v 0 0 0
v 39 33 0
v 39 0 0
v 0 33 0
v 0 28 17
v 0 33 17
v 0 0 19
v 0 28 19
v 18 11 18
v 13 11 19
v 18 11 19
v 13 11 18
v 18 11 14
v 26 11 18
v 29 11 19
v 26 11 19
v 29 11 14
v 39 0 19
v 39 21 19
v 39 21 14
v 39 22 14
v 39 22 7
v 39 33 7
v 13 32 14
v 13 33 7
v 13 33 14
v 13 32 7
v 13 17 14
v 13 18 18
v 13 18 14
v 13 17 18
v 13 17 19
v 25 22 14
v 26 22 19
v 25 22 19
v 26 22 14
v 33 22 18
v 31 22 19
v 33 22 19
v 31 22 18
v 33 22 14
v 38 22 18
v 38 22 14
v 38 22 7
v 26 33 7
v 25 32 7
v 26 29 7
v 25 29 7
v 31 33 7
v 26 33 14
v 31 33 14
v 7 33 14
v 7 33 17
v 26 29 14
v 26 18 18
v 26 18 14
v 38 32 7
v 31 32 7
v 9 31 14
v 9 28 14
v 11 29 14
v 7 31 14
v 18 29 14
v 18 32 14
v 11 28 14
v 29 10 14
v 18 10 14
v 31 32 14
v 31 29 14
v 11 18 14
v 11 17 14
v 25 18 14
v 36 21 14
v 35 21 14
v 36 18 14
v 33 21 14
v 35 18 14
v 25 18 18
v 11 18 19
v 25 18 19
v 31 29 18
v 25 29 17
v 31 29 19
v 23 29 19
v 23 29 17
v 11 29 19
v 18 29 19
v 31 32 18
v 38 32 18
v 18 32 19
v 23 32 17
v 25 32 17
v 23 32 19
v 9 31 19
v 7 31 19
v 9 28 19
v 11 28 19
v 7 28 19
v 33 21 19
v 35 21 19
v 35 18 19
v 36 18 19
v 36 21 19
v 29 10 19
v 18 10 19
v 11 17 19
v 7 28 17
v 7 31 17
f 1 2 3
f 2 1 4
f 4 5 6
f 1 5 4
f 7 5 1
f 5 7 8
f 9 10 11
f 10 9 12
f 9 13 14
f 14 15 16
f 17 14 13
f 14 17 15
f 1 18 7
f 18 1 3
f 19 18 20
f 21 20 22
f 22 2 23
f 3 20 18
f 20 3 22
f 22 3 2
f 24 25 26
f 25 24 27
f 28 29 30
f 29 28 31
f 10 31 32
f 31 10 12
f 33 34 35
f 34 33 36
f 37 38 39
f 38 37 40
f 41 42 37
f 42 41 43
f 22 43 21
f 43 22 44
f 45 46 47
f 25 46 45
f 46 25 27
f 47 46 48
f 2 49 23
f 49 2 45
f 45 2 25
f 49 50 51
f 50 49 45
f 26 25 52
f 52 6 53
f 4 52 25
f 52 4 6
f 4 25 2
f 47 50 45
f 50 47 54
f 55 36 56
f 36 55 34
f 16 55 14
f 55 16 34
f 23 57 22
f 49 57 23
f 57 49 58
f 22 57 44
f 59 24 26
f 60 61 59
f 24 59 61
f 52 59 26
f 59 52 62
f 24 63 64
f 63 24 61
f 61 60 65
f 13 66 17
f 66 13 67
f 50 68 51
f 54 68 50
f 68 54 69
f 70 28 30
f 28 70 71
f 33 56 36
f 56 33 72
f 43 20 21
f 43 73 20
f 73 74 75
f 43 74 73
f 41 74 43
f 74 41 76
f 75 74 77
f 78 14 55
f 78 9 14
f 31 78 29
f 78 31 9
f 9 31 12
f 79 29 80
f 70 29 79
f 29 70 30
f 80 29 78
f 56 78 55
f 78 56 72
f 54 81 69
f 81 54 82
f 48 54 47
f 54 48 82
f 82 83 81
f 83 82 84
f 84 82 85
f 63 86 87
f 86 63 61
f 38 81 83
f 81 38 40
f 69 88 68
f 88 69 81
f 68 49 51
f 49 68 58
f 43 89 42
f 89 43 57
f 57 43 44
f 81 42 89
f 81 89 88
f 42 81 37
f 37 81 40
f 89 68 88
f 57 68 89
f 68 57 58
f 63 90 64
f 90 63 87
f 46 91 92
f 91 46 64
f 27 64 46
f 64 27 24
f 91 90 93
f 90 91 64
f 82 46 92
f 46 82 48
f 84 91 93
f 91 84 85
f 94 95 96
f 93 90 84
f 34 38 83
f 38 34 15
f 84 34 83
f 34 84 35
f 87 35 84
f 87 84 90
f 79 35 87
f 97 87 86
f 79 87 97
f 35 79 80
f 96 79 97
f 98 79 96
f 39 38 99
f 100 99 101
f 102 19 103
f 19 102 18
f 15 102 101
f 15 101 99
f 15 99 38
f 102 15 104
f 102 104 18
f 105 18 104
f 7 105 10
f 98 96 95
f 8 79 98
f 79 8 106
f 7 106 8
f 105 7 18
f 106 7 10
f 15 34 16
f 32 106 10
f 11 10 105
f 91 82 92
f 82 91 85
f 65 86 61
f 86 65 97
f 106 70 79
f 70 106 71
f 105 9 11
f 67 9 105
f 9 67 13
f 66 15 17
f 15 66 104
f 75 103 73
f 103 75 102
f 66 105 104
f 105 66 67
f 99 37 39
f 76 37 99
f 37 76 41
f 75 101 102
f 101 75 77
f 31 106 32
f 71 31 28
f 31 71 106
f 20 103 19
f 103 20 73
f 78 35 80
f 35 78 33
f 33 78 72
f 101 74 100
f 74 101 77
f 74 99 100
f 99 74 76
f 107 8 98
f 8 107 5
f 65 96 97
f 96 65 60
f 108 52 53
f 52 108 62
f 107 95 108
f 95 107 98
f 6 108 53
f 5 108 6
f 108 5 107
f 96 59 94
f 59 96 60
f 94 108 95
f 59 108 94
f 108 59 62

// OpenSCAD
translate([6.5, 5.5, 3.5]) color([0.8768405645756486, 0.1552431358080847, 0.1767648869043179]) cube([13, 11, 7], center=true);
translate([19.5, 5.5, 3.5]) color([0.991228648099722, 0.13558077637136434, 0.20650423900368708]) cube([13, 11, 7], center=true);
translate([32.5, 5.5, 3.5]) color([0.9151210693627757, 0.49673738754911745, 0.7672539256192649]) cube([13, 11, 7], center=true);
translate([6.5, 16.5, 3.5]) color([0.969306850533619, 0.23531586477578126, 0.13212860983739783]) cube([13, 11, 7], center=true);
translate([19.5, 16.5, 3.5]) color([0.23368957459901674, 0.38460662479298113, 0.6084990843462054]) cube([13, 11, 7], center=true);
translate([32.5, 16.5, 3.5]) color([0.1325407149567407, 0.4984659545183915, 0.9178662904203972]) cube([13, 11, 7], center=true);
translate([6.5, 27.5, 3.5]) color([0.6160167741323543, 0.02601445858505036, 0.596125612844632]) cube([13, 11, 7], center=true);
translate([19.5, 27.5, 3.5]) color([0.48919913512172475, 0.30869925031539414, 0.9586301909392594]) cube([13, 11, 7], center=true);
translate([32.5, 27.5, 3.5]) color([0.5555224541780607, 0.16303723797834868, 0.8790785483620981]) cube([13, 11, 7], center=true);
translate([6.5, 5.5, 10.5]) color([0.8092366229990562, 0.7373715302416316, 0.5460288399006699]) cube([13, 11, 7], center=true);
translate([19.5, 5.5, 10.5]) color([0.7042240787132147, 0.07877233817546292, 0.13744427713979768]) cube([13, 11, 7], center=true);
translate([32.5, 5.5, 10.5]) color([0.40185422229333856, 0.1910666288561843, 0.31642065037316636]) cube([13, 11, 7], center=true);
translate([6.5, 16.5, 10.5]) color([0.2917281417853558, 0.9437754009602987, 0.20866341172373193]) cube([13, 11, 7], center=true);
translate([19.5, 14.5, 12.5]) color([0.3151573145870893, 0.7470721078045024, 0.24960896628473228]) cube([13, 7, 11], center=true);
translate([32.5, 16.5, 10.5]) color([0.8629627260654799, 0.6684326881602258, 0.6597695027130189]) cube([13, 11, 7], center=true);
translate([19.5, 23.5, 10.5]) color([0.22591717735012307, 0.3441717078654829, 0.16233220178561225]) cube([13, 11, 7], center=true);
translate([6.5, 27.5, 10.5]) color([0.01697652307419406, 0.5735931064152219, 0.05818297514553228]) cube([13, 11, 7], center=true);
translate([28.5, 27.5, 10.5]) color([0.6304378073753134, 0.35341956482818127, 0.49110709598533775]) cube([5, 11, 7], center=true);
translate([34.5, 24.5, 12.5]) color([0.06132304686728618, 0.24146702174069912, 0.012441234482642782]) cube([7, 5, 11], center=true);
translate([34.5, 29.5, 12.5]) color([0.9455344576677447, 0.3266678829978785, 0.820956849026723]) cube([7, 5, 11], center=true);
translate([15.5, 30.5, 10.5]) color([0.34492851027915805, 0.6639756368298299, 0.13585073420724958]) cube([5, 3, 7], center=true);
translate([21.5, 30.5, 9.5]) color([0.9219835342207869, 0.44896684911260887, 0.1420549627992148]) cube([7, 3, 5], center=true);
translate([20.5, 30.5, 15.5]) color([0.3119518323014343, 0.6490756968320398, 0.7280642389267371]) cube([5, 3, 7], center=true);
translate([24.0, 30.5, 14.5]) color([0.7852833252199665, 0.40863068686923587, 0.009633238682779877]) cube([2, 3, 5], center=true);
translate([5.5, 3.5, 16.5]) color([0.8909238596539266, 0.533705581213062, 0.8046005274030336]) cube([11, 7, 5], center=true);
translate([14.5, 5.5, 16.5]) color([0.9806276909012095, 0.7049346898693578, 0.7590860206033218]) cube([7, 11, 5], center=true);
translate([23.5, 3.5, 16.5]) color([0.5647284680717275, 0.12259546226958773, 0.9539533584587191]) cube([11, 7, 5], center=true);
translate([32.5, 5.5, 16.5]) color([0.1713156178825357, 0.5005542720722199, 0.621843985236089]) cube([7, 11, 5], center=true);
translate([37.5, 3.5, 16.5]) color([0.6619765424276485, 0.8400519693824264, 0.699601591737329]) cube([3, 7, 5], center=true);
translate([5.5, 10.5, 16.5]) color([0.07964741684534404, 0.23738047361475634, 0.8282556520451495]) cube([11, 7, 5], center=true);
translate([21.5, 8.5, 16.5]) color([0.1762738246231843, 0.9459581227747745, 0.9565644324307663]) cube([7, 3, 5], center=true);
translate([26.0, 8.5, 16.5]) color([0.8963269305888116, 0.7428117304122551, 0.8383436924491765]) cube([2, 3, 5], center=true);
translate([28.0, 8.5, 16.5]) color([0.5614087817692366, 0.7177928021437573, 0.4271772721979724]) cube([2, 3, 5], center=true);
translate([37.5, 10.5, 16.5]) color([0.8646648421725511, 0.10365846470378459, 0.6285317276232824]) cube([3, 7, 5], center=true);
translate([12.0, 12.5, 16.5]) color([0.7101075213407797, 0.6149371087697887, 0.0400488022899097]) cube([2, 3, 5], center=true);
translate([29.5, 16.5, 16.5]) color([0.34025031183581533, 0.7380159626358669, 0.3765176313166855]) cube([7, 11, 5], center=true);
translate([34.5, 14.5, 16.5]) color([0.6257641682954356, 0.8894786539399329, 0.4963449395419606]) cube([3, 7, 5], center=true);
translate([5.5, 17.5, 16.5]) color([0.3583651728386771, 0.6716454412848432, 0.45811681625355094]) cube([11, 7, 5], center=true);
translate([12.0, 15.5, 16.5]) color([0.5074379917667022, 0.16228475224599026, 0.7529781863444399]) cube([2, 3, 5], center=true);
translate([37.5, 17.5, 16.5]) color([0.3376457636791449, 0.8033239356600728, 0.9444207727357242]) cube([3, 7, 5], center=true);
translate([14.5, 23.5, 16.5]) color([0.014783921172948133, 0.5303420268039528, 0.2882277186993394]) cube([7, 11, 5], center=true);
translate([21.5, 23.5, 16.5]) color([0.4689175335863792, 0.03492832759702502, 0.5317931441254861]) cube([7, 11, 5], center=true);
translate([34.0, 19.5, 16.5]) color([0.552095437515129, 0.9340898594770107, 0.03830085289416996]) cube([2, 3, 5], center=true);
translate([5.5, 24.5, 16.5]) color([0.3950652682884612, 0.1200155720396251, 0.34658884626630715]) cube([11, 7, 5], center=true);
translate([26.5, 25.5, 16.5]) color([0.051152415727703016, 0.2730496953424699, 0.9956802504828091]) cube([3, 7, 5], center=true);
translate([29.5, 25.5, 16.5]) color([0.25391998649183944, 0.6803935586065328, 0.7027090324157298]) cube([3, 7, 5], center=true);
translate([3.5, 30.5, 15.5]) color([0.9291230685247301, 0.9949404722907454, 0.7620813713006523]) cube([7, 5, 3], center=true);
translate([8.0, 29.5, 16.5]) color([0.7625973189567923, 0.5162610213479427, 0.3860717563215982]) cube([2, 3, 5], center=true);
